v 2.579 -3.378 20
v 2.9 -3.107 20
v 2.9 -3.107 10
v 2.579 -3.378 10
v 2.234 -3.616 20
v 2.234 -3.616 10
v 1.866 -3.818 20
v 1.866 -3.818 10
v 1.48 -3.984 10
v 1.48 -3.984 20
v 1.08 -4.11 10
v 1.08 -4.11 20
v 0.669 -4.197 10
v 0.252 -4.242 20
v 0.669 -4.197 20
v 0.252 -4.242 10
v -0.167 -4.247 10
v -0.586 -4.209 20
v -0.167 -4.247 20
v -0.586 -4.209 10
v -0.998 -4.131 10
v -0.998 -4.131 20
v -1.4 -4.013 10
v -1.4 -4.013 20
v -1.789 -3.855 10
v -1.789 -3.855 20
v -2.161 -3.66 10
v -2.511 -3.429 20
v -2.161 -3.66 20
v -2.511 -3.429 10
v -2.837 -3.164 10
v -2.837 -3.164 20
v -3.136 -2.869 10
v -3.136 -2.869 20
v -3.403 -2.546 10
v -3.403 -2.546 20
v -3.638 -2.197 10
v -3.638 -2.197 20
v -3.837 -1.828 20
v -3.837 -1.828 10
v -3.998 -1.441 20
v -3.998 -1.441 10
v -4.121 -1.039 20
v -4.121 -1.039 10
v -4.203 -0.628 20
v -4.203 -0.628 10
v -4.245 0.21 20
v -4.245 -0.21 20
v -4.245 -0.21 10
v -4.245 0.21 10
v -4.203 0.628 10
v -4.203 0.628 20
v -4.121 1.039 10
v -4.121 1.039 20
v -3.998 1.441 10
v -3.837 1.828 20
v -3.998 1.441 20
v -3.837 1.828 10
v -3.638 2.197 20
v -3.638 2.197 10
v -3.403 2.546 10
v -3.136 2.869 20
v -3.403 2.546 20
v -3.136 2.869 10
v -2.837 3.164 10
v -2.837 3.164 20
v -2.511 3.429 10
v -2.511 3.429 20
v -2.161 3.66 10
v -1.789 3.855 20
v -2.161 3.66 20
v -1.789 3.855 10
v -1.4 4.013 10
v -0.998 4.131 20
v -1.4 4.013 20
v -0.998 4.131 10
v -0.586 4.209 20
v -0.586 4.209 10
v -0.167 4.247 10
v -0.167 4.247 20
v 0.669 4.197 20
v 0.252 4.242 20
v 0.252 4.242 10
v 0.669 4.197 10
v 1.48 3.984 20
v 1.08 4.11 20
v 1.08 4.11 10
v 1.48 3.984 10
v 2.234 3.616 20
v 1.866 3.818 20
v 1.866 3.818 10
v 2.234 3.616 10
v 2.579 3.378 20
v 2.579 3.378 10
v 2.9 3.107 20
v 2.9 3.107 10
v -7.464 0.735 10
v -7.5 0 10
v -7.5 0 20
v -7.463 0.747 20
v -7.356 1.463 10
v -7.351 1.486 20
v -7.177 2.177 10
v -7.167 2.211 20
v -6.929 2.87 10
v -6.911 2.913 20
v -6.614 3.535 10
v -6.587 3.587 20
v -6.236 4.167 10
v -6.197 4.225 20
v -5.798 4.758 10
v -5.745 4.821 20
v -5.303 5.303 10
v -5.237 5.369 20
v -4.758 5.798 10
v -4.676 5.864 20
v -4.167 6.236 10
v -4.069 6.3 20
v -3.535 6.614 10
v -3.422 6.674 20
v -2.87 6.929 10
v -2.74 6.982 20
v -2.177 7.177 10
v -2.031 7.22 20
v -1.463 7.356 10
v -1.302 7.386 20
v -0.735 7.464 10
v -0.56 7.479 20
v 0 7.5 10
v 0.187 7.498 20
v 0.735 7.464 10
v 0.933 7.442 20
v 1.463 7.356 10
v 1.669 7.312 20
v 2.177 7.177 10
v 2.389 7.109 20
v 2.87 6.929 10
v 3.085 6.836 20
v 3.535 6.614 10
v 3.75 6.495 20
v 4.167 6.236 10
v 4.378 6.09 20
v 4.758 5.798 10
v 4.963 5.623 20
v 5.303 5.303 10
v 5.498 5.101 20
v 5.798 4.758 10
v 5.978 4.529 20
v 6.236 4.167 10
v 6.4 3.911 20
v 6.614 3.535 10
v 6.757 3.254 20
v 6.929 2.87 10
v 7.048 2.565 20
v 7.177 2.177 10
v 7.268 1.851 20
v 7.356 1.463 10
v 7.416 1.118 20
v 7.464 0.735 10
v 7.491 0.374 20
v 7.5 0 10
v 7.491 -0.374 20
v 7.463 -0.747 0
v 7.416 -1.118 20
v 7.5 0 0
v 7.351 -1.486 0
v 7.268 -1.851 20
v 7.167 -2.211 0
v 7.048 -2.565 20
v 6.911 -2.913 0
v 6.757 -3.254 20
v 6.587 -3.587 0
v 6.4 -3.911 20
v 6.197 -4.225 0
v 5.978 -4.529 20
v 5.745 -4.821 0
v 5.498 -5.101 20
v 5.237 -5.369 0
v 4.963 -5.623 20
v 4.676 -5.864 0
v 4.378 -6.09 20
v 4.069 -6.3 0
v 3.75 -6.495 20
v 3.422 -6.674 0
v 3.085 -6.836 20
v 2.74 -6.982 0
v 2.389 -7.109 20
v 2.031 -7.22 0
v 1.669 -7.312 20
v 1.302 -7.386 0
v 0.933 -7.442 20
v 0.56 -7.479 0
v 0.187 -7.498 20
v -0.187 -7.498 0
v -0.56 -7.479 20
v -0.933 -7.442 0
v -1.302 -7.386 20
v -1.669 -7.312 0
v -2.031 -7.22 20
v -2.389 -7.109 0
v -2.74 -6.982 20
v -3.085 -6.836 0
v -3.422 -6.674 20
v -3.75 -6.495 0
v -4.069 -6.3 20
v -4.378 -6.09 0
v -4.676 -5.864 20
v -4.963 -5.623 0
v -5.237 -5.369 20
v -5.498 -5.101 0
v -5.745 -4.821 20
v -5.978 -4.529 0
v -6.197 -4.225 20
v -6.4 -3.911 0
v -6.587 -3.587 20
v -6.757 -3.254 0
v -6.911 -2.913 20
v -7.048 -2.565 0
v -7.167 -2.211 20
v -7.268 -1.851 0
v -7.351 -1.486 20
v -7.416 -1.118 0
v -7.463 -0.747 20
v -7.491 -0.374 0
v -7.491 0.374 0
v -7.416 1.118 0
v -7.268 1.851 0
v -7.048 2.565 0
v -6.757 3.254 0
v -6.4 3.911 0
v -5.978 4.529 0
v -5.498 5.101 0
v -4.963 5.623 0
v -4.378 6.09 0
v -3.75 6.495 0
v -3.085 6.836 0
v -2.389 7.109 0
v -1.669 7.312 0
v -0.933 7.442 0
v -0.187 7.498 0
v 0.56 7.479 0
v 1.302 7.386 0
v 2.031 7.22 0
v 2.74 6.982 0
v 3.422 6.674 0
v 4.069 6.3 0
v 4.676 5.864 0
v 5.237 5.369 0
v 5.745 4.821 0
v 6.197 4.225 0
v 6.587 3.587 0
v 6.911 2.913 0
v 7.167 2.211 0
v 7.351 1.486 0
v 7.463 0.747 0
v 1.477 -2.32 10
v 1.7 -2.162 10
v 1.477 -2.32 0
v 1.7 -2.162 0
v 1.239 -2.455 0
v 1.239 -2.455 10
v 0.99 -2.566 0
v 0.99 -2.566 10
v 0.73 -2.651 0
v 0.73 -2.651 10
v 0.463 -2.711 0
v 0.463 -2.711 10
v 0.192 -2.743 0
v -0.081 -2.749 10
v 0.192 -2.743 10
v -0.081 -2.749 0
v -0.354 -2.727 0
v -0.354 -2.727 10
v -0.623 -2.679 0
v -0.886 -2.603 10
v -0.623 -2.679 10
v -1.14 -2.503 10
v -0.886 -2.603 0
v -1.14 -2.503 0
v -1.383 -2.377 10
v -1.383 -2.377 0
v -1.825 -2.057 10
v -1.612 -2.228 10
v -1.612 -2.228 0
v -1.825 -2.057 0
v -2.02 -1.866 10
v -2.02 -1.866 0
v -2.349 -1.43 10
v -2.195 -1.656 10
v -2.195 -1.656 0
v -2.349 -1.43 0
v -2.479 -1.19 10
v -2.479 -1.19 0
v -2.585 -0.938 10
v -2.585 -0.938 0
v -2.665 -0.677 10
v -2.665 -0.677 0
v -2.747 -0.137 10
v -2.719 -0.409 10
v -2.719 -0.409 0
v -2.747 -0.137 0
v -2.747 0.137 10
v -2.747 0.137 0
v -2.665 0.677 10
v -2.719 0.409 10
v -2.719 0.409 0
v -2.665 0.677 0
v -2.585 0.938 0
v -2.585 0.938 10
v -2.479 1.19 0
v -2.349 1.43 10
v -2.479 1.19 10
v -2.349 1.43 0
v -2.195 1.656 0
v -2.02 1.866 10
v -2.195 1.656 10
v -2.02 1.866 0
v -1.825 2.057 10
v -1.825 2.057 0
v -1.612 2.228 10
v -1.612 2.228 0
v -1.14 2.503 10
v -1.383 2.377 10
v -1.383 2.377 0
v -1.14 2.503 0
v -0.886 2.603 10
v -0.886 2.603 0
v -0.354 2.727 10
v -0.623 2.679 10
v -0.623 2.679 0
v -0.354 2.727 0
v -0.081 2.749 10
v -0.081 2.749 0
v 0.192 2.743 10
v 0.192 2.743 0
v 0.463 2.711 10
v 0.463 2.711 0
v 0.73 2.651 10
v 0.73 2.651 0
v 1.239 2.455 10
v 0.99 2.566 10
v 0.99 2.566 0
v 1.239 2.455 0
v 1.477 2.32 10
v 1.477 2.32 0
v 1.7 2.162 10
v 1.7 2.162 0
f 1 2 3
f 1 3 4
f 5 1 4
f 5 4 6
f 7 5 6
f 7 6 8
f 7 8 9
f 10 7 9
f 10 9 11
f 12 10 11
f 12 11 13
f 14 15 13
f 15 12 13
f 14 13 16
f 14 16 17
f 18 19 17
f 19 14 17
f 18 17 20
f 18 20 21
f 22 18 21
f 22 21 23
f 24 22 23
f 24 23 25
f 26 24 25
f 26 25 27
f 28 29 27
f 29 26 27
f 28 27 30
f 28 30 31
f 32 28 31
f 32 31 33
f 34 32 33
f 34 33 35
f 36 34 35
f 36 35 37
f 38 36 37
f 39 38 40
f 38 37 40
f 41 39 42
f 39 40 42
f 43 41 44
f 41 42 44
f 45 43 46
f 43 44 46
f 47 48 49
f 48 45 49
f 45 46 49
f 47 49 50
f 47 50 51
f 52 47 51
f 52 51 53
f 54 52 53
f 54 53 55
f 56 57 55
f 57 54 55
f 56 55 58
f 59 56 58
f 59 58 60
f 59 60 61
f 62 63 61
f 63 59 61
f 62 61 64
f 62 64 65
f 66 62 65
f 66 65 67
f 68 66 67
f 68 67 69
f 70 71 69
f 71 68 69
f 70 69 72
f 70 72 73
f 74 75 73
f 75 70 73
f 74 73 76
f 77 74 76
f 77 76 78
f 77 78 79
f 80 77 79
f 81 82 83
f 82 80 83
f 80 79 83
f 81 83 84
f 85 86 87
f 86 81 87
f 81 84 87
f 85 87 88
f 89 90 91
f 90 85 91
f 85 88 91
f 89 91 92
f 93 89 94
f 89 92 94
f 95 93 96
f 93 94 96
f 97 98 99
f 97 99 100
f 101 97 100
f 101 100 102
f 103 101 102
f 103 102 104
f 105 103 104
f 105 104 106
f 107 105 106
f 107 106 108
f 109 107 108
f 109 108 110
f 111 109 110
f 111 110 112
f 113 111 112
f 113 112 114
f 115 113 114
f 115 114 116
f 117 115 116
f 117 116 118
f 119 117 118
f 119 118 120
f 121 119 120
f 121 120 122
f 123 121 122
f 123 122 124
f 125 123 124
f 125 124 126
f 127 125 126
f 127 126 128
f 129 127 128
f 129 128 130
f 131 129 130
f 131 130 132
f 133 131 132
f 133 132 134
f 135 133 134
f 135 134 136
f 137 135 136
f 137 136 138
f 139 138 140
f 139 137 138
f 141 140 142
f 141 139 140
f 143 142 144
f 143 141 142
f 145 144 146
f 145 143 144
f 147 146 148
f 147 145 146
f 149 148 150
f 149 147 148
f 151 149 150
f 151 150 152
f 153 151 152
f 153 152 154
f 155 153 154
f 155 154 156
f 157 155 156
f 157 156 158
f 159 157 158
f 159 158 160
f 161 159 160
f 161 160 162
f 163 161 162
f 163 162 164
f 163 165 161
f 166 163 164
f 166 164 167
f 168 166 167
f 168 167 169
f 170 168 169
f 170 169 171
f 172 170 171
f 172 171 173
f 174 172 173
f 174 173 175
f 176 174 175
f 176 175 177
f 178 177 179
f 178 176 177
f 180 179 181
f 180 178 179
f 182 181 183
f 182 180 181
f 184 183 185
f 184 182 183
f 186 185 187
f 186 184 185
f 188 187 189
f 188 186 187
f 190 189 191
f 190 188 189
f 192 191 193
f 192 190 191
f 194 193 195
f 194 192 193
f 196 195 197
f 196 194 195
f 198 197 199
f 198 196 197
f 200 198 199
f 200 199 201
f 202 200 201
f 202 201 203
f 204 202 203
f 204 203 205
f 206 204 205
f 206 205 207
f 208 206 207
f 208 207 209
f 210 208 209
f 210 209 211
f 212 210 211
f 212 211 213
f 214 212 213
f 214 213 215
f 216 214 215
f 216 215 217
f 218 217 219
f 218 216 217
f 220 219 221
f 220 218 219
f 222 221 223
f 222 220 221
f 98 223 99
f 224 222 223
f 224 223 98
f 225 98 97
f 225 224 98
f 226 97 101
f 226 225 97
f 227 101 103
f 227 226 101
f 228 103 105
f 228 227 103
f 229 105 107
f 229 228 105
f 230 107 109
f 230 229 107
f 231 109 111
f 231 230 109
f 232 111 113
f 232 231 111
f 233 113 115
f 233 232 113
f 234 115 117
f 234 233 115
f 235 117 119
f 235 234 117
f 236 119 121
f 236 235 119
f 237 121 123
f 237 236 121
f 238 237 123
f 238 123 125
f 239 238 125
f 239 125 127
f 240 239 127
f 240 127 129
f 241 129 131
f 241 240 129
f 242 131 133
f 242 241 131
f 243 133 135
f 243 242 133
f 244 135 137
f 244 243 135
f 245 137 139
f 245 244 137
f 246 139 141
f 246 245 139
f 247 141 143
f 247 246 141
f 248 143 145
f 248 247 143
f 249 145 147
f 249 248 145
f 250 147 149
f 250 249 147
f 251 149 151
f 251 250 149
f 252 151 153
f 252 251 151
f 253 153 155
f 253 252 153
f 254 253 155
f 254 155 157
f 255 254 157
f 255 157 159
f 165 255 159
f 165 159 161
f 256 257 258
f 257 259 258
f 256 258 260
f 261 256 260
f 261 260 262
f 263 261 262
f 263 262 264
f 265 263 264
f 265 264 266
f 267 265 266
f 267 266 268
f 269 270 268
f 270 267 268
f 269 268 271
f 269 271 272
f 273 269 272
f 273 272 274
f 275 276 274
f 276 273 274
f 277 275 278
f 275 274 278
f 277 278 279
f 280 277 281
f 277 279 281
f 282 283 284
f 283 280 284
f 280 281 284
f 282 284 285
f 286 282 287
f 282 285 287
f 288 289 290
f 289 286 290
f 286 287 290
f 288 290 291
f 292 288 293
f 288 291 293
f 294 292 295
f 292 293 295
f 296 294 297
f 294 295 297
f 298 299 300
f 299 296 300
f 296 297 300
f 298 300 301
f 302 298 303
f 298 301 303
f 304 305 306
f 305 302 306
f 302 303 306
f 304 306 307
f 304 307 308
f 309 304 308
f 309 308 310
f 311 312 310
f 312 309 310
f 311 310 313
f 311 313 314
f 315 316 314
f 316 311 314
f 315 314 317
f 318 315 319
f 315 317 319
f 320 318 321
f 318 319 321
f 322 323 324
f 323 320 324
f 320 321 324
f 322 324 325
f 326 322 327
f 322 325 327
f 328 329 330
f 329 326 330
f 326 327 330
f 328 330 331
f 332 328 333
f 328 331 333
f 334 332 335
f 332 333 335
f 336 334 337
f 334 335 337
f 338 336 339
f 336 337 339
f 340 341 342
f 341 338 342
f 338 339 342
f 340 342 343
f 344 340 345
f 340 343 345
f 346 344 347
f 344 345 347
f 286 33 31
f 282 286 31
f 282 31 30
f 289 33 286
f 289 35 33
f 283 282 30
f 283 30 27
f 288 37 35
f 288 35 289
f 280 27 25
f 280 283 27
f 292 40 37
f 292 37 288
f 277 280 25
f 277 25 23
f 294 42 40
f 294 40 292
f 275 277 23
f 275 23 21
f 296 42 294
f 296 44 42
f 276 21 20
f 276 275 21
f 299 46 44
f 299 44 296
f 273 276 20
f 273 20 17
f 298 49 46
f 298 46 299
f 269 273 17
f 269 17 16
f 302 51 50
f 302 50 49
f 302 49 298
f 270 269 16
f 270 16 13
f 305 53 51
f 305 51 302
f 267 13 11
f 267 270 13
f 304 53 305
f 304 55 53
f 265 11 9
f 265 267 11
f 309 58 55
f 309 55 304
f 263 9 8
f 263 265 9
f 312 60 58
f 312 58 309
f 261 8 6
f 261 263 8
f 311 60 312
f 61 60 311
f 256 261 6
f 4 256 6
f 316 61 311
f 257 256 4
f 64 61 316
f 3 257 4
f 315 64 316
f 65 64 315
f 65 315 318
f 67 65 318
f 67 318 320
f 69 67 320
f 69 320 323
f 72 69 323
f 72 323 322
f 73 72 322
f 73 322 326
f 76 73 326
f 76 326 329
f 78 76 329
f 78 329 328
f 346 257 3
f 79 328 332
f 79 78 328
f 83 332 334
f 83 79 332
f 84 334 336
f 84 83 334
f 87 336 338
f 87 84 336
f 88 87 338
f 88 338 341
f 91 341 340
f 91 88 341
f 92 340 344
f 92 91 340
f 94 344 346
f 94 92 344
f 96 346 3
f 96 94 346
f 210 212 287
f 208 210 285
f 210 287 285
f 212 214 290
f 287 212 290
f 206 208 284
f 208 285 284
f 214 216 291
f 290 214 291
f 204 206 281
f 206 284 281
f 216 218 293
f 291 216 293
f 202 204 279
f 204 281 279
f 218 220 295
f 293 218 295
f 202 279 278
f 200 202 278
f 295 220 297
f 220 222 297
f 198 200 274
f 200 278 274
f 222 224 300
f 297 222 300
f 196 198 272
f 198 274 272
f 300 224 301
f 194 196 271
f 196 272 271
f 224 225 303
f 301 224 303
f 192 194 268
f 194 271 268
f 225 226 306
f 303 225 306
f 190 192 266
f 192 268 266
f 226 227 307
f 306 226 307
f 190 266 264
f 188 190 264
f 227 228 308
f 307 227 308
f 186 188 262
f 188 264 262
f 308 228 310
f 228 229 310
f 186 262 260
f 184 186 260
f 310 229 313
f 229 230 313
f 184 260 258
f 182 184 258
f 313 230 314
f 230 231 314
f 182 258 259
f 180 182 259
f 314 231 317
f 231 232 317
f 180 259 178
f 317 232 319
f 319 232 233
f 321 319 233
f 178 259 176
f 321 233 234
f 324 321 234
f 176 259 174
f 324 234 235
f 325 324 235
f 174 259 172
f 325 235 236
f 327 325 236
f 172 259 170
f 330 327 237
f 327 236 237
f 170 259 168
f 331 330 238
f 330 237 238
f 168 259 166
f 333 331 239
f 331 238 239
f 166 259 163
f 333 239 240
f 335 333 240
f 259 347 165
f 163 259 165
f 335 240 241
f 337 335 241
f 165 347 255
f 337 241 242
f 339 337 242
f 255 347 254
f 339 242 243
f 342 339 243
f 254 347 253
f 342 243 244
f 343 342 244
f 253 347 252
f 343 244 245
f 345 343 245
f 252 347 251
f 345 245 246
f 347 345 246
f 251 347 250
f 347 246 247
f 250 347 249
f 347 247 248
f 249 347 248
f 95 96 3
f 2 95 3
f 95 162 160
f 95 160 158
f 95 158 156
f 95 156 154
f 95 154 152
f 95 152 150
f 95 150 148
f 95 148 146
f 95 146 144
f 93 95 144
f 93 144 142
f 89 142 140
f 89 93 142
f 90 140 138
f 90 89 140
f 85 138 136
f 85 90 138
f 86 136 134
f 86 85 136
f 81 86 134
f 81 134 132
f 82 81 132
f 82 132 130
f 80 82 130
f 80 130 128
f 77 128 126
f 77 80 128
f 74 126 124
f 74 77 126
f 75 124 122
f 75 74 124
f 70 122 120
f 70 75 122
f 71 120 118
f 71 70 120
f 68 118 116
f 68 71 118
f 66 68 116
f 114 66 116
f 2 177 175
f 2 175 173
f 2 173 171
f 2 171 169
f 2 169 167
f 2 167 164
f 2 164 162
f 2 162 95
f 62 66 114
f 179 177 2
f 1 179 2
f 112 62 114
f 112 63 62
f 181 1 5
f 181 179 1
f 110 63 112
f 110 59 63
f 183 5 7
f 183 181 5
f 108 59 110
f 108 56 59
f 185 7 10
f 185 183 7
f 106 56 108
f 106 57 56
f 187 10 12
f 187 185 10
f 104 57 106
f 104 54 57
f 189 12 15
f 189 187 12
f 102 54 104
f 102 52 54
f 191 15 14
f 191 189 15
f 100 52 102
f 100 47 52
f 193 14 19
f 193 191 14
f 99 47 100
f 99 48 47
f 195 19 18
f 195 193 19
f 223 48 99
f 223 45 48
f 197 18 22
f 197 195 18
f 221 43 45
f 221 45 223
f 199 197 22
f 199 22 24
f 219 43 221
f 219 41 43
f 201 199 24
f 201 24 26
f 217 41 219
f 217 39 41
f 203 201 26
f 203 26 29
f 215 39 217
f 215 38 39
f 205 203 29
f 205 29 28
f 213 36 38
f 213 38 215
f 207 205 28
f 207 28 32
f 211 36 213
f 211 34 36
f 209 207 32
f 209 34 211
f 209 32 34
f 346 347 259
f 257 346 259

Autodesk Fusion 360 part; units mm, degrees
sketch "Sketch5" plane through (0, 0, 0) normal (0, 0, 1) x (1, 0, 0)
  circle A0 centre (0, 0) radius 7.5
  line L0 (1.7, 2.1616) -> (1.7, -2.1616)
  arc A1 (1.7, 2.1616) -> (1.7, -2.1616) centre (0, 0) ccw
  dimension "d19" = 15
  dimension "d29" = 5.5
  dimension "d30" = 1.7
extrude "Extrude7" add sketch "Sketch5" along normal blind 10
sketch "Sketch7" plane through (0, 0, 10) normal (0, 0, 1) x (-1, 0, 0)
  arc A0 (-1.7, -2.1616) -> (-1.7, 2.1616) centre (0, 0) ccw
  line L0 (-1.7, -2.1616) -> (-1.7, 2.1616)
  circle A1 centre (0, 0) radius 7.5
  circle A2 centre (0, 0) radius 7.5
  line L1 (-2.9, -3.1068) -> (-2.9, 3.1068)
  arc A3 (-2.9, -3.1068) -> (-2.9, 3.1068) centre (0, 0) ccw
  dimension "d35" = 8.5
  dimension "d36" = 2.9
extrude "Extrude8" add sketch "Sketch7" along normal blind 10 contours A1 A2
